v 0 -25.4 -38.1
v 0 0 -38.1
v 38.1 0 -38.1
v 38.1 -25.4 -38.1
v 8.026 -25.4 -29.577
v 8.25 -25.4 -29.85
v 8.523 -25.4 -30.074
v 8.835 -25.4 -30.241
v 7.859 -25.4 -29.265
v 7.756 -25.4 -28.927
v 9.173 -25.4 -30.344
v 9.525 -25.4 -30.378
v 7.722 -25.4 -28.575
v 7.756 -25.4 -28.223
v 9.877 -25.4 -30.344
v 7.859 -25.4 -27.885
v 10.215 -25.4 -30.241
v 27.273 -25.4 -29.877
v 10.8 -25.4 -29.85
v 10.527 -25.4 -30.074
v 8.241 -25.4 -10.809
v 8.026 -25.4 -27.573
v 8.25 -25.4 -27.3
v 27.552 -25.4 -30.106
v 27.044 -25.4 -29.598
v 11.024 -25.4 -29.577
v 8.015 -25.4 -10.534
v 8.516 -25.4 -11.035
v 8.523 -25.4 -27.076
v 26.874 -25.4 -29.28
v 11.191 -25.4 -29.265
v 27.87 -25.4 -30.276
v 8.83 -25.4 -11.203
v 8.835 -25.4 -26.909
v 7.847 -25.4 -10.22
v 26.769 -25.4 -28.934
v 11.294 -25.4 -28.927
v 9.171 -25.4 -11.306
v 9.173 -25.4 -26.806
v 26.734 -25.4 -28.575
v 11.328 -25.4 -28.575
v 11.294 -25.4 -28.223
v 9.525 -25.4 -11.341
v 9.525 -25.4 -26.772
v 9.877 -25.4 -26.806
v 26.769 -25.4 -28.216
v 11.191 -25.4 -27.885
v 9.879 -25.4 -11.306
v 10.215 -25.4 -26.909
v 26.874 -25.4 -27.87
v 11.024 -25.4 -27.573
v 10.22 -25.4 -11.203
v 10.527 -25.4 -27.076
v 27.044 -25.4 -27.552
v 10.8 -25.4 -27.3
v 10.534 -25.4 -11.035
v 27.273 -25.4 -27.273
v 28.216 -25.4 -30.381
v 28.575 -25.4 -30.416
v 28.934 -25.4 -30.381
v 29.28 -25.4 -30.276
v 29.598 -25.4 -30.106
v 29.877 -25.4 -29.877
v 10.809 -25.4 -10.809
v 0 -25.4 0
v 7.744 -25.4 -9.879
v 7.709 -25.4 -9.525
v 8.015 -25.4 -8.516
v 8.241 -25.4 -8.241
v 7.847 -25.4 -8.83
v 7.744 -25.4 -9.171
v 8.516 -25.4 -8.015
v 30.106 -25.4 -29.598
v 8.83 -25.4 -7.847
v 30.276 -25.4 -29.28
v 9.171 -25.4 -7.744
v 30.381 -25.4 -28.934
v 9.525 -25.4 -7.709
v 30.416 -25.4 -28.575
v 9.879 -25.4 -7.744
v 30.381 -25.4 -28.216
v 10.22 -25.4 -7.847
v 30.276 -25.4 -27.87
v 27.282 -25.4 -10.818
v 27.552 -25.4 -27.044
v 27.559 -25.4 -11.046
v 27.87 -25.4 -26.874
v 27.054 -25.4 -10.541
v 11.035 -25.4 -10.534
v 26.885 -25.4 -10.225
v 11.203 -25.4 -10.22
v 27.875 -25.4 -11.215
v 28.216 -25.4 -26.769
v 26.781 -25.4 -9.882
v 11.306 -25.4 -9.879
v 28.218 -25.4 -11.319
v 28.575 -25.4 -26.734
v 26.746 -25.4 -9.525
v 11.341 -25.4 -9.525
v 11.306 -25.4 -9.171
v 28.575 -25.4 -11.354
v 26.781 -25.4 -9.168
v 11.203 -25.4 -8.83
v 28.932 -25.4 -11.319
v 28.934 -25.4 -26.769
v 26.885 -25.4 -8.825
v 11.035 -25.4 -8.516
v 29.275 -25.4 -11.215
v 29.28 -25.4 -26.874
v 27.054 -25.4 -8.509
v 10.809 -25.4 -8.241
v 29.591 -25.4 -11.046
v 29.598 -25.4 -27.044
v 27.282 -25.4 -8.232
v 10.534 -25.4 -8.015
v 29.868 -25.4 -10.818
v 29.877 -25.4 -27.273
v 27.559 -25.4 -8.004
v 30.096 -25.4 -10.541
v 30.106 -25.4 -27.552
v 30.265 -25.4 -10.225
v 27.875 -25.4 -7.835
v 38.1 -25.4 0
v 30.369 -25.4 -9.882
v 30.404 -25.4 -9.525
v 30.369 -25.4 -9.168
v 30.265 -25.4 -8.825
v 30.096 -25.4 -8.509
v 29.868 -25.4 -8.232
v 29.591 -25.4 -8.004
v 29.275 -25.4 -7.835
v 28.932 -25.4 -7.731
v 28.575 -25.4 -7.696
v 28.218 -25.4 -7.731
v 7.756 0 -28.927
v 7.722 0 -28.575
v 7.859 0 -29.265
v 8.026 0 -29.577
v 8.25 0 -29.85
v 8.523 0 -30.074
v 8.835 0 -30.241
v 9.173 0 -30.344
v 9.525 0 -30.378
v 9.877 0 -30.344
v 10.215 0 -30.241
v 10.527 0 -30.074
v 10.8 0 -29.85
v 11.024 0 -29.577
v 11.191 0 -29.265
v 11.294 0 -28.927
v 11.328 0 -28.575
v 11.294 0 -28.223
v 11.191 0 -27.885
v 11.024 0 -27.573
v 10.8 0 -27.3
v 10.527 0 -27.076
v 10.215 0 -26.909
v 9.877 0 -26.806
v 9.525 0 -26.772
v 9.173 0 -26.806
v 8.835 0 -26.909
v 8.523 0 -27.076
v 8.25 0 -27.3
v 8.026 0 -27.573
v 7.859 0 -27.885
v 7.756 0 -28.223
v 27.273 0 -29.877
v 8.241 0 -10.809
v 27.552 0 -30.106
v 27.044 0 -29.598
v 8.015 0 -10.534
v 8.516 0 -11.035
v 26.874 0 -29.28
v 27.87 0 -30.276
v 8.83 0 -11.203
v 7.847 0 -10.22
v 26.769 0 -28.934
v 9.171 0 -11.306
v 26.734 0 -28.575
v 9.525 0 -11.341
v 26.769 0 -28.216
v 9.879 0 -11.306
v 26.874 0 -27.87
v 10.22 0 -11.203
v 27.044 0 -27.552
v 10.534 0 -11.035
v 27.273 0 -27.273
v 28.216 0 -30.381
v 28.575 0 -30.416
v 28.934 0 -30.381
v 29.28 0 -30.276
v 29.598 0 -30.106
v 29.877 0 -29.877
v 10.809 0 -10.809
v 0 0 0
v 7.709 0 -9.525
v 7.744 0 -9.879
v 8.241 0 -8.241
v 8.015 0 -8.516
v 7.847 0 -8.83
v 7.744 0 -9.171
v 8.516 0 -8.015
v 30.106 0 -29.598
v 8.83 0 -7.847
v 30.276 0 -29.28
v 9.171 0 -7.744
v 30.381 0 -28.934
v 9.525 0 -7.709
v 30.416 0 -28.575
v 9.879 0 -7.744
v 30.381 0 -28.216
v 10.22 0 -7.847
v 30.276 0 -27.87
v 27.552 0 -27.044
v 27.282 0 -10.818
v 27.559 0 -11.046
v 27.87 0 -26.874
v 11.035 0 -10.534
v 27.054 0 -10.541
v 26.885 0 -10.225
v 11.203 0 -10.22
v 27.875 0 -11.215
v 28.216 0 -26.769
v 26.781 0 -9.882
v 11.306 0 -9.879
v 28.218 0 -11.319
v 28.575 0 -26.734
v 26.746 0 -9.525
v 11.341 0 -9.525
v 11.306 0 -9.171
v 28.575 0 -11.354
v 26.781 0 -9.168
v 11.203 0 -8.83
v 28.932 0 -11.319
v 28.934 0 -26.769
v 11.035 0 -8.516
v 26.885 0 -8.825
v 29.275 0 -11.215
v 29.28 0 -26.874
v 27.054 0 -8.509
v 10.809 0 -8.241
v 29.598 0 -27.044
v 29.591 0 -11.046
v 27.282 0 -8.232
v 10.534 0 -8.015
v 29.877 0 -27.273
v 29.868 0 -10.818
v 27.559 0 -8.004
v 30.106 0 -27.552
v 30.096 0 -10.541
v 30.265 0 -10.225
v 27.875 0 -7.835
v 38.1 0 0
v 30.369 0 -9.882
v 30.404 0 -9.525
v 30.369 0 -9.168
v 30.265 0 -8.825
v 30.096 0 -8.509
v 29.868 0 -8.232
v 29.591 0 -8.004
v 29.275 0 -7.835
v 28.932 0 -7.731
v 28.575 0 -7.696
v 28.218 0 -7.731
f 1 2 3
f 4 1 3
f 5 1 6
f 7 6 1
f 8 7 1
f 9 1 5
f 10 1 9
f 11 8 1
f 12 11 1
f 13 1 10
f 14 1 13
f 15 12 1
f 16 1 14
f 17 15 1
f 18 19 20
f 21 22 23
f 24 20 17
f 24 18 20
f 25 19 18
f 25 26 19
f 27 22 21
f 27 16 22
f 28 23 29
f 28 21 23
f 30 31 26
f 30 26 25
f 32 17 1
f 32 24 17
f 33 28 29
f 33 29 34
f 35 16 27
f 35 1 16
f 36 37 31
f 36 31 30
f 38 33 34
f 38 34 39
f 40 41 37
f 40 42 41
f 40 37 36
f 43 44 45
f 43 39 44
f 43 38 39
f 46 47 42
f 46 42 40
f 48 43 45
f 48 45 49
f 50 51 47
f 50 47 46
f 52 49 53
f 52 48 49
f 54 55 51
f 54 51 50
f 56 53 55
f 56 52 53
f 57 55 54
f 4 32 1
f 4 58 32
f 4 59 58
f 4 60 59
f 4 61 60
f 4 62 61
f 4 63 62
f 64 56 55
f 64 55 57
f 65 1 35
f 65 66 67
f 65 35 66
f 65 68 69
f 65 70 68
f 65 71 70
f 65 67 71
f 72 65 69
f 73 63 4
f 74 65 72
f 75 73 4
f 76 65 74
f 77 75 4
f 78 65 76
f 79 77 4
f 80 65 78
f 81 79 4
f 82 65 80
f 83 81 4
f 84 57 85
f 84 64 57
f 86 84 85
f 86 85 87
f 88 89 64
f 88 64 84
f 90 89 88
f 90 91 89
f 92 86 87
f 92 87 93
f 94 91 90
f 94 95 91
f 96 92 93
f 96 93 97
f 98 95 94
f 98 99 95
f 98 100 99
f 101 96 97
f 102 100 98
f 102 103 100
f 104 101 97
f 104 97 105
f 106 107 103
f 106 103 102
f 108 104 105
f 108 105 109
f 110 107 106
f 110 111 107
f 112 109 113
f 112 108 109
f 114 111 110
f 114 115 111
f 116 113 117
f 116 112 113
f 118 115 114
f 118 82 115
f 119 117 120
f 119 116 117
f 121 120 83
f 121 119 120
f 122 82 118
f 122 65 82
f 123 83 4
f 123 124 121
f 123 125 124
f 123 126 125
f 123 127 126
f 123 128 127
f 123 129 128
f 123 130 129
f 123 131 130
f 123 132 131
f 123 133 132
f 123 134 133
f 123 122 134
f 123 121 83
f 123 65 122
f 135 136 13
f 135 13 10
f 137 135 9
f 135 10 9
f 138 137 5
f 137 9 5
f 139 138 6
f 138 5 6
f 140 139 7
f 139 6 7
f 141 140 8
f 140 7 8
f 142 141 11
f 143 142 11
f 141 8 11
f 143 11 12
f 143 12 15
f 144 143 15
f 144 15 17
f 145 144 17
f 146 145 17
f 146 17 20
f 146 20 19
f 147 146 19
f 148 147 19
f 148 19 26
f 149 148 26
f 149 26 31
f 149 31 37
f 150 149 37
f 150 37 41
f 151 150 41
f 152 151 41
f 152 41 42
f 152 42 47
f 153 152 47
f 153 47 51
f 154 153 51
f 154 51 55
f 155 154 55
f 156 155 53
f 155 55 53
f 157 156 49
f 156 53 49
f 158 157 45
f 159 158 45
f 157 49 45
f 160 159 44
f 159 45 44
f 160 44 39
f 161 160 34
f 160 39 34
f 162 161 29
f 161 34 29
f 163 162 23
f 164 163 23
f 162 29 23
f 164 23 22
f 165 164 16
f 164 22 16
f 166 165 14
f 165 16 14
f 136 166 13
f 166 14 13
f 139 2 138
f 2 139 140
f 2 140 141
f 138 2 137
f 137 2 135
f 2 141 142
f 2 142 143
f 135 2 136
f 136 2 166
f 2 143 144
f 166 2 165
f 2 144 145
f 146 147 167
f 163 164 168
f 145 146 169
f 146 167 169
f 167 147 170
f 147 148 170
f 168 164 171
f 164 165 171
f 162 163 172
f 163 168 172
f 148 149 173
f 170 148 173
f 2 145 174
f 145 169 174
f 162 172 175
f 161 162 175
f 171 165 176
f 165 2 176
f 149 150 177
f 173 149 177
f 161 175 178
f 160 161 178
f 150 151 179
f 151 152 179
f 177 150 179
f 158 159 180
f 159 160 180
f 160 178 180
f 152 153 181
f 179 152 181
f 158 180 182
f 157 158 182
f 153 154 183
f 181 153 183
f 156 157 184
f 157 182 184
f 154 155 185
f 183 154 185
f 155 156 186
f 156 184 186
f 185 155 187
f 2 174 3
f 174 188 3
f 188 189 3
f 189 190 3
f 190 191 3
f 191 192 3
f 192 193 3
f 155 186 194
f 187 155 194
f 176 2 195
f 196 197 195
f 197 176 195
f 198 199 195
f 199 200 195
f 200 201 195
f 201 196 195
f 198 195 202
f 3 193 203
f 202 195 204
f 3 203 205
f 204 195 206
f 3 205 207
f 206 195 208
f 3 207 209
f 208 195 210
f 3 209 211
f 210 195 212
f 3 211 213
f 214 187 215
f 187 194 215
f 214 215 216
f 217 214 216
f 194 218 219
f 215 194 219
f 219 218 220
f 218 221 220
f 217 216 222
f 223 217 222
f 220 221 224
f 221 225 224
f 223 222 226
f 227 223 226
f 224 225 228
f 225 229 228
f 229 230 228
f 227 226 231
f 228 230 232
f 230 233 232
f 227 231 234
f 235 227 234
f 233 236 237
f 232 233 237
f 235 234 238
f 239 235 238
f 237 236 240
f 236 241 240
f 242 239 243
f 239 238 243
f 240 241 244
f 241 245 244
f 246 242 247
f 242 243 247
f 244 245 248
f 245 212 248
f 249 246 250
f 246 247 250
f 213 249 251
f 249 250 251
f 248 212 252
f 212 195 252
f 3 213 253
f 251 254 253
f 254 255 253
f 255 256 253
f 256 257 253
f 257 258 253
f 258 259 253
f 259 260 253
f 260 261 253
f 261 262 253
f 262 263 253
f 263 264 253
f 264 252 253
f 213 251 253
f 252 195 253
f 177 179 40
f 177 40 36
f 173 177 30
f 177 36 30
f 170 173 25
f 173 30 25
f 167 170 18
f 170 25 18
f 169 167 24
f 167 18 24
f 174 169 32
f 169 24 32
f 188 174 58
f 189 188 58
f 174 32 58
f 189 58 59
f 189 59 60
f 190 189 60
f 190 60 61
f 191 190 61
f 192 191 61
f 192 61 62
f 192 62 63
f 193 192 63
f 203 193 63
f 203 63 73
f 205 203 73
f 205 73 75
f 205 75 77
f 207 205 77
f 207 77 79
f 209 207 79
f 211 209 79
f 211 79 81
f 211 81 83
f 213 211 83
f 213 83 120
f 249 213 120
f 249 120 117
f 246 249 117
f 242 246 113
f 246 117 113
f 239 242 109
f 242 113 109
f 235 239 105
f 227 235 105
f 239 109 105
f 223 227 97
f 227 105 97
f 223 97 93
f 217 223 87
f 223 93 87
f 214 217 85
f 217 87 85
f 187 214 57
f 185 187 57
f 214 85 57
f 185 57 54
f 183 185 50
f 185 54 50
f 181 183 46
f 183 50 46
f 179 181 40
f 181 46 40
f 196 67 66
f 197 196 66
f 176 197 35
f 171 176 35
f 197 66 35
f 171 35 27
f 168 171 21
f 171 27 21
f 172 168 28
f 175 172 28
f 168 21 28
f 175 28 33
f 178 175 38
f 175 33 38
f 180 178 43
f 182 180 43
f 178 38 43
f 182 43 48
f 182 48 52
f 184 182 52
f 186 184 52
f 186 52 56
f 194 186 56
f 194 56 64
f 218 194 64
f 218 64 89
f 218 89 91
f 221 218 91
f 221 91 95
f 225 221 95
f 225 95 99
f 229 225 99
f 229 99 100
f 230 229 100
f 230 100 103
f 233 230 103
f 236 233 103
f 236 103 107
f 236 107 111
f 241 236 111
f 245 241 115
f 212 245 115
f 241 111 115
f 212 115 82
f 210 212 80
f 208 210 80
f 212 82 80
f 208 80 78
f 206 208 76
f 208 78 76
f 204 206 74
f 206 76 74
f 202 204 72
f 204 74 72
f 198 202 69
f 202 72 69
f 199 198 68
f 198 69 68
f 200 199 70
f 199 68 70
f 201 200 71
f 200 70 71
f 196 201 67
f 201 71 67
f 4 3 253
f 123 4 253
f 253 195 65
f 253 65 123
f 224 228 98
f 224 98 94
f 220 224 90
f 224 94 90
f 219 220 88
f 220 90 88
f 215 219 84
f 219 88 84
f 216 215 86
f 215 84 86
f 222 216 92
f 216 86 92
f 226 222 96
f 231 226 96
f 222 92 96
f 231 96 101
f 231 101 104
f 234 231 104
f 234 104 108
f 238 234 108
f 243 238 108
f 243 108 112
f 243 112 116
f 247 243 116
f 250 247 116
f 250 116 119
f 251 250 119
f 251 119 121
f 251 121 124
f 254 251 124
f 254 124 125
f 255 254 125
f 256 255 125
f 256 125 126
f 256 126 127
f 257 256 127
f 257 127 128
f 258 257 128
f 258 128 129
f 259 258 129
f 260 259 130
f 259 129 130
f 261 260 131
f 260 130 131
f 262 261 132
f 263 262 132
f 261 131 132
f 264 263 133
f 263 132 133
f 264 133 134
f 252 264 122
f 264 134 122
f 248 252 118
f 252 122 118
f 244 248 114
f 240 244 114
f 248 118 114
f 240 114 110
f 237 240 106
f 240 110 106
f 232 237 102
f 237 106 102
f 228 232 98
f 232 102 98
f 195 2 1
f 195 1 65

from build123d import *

# Parameters (mm, degrees)
F0_W     = 38.1
F0_H     = 38.1
F2_DEPTH = 25.4
F3_D     = 3.6322
F4_D     = 3.6576
F5_D     = 3.6068
F6_D     = 3.683


with BuildPart() as f2:
    # F0 (on Front) → F2 (new body)
    with BuildSketch(Plane.XZ):
        with Locations((19.05, -19.05)):
            Rectangle(F0_W, F0_H)
    extrude(amount=F2_DEPTH)

    # F3 (through all)
    with Locations(Plane(origin=(0, 0, 0), x_dir=(1, 0, 0), z_dir=(0, 1, 0))):
        with Locations((9.525, 9.525)):
            Hole(F3_D / 2)

    # F4 (through all)
    with Locations(Plane(origin=(0, 0, 0), x_dir=(1, 0, 0), z_dir=(0, 1, 0))):
        with Locations((28.575, 9.525)):
            Hole(F4_D / 2)

    # F5 (through all)
    with Locations(Plane(origin=(0, 0, 0), x_dir=(1, 0, 0), z_dir=(0, 1, 0))):
        with Locations((9.525, 28.575)):
            Hole(F5_D / 2)

    # F6 (through all)
    with Locations(Plane(origin=(0, 0, 0), x_dir=(1, 0, 0), z_dir=(0, 1, 0))):
        with Locations((28.575, 28.575)):
            Hole(F6_D / 2)


solid = f2.part
